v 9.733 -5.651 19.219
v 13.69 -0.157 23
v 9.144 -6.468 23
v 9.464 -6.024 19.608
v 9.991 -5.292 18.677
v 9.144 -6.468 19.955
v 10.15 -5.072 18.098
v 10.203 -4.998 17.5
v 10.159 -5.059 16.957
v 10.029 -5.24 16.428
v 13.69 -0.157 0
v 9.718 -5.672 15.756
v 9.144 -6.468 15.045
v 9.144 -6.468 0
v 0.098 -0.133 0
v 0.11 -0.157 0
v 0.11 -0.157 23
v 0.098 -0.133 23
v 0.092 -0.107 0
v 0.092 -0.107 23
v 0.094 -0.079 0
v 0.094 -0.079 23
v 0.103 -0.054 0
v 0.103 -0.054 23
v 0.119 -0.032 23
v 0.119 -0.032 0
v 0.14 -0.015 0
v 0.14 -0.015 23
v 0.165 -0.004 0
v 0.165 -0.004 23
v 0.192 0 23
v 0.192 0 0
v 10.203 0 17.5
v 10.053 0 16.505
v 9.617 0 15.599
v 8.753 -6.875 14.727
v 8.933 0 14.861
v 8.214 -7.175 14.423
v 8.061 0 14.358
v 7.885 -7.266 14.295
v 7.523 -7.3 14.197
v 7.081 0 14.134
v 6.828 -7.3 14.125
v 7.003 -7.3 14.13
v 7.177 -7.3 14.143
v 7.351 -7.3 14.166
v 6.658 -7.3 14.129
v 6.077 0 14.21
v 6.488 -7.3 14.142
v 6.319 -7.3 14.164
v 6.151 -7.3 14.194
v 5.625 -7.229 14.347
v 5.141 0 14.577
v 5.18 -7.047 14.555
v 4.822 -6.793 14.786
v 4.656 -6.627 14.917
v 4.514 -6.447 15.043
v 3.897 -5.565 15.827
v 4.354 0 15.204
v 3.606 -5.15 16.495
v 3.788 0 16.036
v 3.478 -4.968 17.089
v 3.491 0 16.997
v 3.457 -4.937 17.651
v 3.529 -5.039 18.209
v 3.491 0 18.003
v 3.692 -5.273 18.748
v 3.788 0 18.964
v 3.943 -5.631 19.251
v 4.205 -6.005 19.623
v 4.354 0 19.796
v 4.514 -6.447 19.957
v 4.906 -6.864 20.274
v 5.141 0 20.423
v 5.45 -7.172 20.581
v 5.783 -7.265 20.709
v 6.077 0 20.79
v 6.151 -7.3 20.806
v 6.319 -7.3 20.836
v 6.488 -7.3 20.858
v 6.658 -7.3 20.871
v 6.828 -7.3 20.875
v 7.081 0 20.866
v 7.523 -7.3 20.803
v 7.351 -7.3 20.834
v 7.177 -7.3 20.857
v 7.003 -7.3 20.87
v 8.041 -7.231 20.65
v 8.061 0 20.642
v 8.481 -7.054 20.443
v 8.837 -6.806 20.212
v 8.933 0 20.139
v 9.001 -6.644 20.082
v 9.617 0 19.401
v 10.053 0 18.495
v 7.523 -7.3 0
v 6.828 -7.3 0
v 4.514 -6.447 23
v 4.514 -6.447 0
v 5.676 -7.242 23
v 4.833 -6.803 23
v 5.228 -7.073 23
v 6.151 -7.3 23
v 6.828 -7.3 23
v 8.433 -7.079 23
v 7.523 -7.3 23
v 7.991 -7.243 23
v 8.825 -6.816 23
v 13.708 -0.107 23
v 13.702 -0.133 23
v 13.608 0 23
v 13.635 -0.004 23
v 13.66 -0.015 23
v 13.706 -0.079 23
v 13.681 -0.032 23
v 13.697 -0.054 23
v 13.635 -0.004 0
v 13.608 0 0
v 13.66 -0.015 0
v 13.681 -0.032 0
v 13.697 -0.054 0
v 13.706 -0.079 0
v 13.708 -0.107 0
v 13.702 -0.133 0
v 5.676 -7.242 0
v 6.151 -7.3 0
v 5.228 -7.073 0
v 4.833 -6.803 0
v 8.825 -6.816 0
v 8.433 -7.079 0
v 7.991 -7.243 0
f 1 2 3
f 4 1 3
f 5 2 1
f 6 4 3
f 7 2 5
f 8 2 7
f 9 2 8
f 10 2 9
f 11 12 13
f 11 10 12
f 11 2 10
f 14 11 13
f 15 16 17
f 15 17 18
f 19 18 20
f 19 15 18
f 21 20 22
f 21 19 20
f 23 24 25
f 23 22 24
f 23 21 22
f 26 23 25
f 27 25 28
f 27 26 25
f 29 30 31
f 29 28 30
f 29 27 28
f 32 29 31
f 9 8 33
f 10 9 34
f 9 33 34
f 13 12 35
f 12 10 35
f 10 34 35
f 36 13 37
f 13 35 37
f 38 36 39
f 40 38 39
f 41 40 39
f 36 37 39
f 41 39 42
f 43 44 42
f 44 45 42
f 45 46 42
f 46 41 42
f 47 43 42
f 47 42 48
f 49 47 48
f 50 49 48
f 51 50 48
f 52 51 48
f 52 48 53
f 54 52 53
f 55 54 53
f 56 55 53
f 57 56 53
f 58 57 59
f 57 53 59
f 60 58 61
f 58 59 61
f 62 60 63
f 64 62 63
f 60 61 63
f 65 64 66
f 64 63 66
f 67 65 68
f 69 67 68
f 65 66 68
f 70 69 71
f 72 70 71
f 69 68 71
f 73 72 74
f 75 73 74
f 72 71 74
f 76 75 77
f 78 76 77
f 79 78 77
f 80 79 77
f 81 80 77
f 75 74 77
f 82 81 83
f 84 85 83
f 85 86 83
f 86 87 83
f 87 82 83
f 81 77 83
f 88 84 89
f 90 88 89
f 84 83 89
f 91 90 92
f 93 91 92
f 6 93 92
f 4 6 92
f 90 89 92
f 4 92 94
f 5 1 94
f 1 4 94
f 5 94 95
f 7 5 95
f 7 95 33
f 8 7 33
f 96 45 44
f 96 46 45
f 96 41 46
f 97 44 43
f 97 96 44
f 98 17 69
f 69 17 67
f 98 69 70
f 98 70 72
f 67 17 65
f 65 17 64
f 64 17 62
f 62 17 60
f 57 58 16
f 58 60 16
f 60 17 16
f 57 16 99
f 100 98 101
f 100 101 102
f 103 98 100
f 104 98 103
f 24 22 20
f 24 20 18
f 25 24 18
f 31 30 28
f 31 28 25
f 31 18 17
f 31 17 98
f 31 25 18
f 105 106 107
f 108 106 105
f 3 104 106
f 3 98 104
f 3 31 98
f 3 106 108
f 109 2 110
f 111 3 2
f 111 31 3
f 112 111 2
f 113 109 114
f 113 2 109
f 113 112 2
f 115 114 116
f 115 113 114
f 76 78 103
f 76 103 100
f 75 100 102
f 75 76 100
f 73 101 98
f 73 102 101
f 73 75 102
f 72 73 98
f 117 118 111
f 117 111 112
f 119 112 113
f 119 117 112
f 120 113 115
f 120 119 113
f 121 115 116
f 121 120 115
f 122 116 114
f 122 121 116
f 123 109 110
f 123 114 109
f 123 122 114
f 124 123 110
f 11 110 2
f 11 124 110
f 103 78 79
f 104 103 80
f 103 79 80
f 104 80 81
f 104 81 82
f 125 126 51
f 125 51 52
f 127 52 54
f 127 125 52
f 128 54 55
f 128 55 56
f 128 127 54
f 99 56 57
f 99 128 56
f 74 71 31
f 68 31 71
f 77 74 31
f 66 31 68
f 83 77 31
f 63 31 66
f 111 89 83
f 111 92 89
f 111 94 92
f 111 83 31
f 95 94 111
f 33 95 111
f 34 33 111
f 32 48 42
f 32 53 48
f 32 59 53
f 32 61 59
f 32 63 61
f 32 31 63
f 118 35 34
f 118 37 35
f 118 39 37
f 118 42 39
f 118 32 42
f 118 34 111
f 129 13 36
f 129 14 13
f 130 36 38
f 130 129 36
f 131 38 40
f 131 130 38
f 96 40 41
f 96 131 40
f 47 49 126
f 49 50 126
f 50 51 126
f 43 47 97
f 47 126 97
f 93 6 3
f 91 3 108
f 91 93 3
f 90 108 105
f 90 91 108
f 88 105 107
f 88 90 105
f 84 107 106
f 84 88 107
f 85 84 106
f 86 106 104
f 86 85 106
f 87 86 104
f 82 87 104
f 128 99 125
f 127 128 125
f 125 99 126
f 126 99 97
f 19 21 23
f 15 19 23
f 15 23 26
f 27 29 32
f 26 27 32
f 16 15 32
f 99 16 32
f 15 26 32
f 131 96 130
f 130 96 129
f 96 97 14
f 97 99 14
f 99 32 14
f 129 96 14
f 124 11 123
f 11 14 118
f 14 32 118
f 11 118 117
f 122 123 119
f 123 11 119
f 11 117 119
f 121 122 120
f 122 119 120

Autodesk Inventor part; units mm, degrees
ref_plane "YZ Plane" through (0, 0, 0) normal (1, 0, 0) x (0, 1, 0)
ref_plane "XZ Plane" through (0, 0, 0) normal (0, 1, 0) x (-1, 0, 0)
ref_plane "XY Plane" through (0, 0, 0) normal (0, 0, 1) x (1, 0, 0)
sketch "Boceto1" plane through (0, 0, 0) normal (0, 0, 1) x (1, 0, 0)
  line L0 (0.1921, 0) -> (13.6079, 0)
  line L1 (0.1102, -0.1574) -> (4.514, -6.4466)
  line L2 (0, 0) -> (7.6778, 0) construction
  line L3 (6.1507, -7.2995) -> (6.8282, -7.3)
  arc A0 (0.1921, 0) -> (0.1102, -0.1574) centre (0.1921, -0.1) ccw
  arc A1 (13.6898, -0.1574) -> (13.6079, 0) centre (13.6079, -0.1) ccw
  line L4 (6.8282, 0) -> (6.8282, -7.3)
  line L5 (13.6898, -0.1574) -> (9.144, -6.4684)
  line L6 (7.5227, -7.2995) -> (6.8282, -7.3)
  arc A2 (7.5227, -7.2995) -> (9.144, -6.4684) centre (7.5211, -5.2995) ccw
  arc A3 (4.514, -6.4466) -> (6.1507, -7.2995) centre (6.1523, -5.2995) ccw
  point P0 (13.8, 0)
  point P1 (5.1106, -7.2986)
  point P2 (8.5459, -7.2986)
  dimension "d7" = 13.8
  dimension "d9" = 8.91
  dimension "d10" = 55
  dimension "d11" = 0.1
  dimension "d14" = 2
  dimension "d15" = 7.3
extrude "Extrusión1" add sketch "Boceto1" along normal blind 23
sketch "Boceto2" plane through (0.1921, 0, 0) normal (0, 1, 0) x (1, 0, 0)
  circle A0 centre (6.6362, -17.5) radius 3.375
  point P0 (-0.1921, 0)
  point P1 (6.6362, -23)
  dimension "d17" = 6.75
extrude "Extrusión2" cut sketch "Boceto2" against normal blind 7.3
properties part number "Tuerca" material "Acero, galvanizado"
